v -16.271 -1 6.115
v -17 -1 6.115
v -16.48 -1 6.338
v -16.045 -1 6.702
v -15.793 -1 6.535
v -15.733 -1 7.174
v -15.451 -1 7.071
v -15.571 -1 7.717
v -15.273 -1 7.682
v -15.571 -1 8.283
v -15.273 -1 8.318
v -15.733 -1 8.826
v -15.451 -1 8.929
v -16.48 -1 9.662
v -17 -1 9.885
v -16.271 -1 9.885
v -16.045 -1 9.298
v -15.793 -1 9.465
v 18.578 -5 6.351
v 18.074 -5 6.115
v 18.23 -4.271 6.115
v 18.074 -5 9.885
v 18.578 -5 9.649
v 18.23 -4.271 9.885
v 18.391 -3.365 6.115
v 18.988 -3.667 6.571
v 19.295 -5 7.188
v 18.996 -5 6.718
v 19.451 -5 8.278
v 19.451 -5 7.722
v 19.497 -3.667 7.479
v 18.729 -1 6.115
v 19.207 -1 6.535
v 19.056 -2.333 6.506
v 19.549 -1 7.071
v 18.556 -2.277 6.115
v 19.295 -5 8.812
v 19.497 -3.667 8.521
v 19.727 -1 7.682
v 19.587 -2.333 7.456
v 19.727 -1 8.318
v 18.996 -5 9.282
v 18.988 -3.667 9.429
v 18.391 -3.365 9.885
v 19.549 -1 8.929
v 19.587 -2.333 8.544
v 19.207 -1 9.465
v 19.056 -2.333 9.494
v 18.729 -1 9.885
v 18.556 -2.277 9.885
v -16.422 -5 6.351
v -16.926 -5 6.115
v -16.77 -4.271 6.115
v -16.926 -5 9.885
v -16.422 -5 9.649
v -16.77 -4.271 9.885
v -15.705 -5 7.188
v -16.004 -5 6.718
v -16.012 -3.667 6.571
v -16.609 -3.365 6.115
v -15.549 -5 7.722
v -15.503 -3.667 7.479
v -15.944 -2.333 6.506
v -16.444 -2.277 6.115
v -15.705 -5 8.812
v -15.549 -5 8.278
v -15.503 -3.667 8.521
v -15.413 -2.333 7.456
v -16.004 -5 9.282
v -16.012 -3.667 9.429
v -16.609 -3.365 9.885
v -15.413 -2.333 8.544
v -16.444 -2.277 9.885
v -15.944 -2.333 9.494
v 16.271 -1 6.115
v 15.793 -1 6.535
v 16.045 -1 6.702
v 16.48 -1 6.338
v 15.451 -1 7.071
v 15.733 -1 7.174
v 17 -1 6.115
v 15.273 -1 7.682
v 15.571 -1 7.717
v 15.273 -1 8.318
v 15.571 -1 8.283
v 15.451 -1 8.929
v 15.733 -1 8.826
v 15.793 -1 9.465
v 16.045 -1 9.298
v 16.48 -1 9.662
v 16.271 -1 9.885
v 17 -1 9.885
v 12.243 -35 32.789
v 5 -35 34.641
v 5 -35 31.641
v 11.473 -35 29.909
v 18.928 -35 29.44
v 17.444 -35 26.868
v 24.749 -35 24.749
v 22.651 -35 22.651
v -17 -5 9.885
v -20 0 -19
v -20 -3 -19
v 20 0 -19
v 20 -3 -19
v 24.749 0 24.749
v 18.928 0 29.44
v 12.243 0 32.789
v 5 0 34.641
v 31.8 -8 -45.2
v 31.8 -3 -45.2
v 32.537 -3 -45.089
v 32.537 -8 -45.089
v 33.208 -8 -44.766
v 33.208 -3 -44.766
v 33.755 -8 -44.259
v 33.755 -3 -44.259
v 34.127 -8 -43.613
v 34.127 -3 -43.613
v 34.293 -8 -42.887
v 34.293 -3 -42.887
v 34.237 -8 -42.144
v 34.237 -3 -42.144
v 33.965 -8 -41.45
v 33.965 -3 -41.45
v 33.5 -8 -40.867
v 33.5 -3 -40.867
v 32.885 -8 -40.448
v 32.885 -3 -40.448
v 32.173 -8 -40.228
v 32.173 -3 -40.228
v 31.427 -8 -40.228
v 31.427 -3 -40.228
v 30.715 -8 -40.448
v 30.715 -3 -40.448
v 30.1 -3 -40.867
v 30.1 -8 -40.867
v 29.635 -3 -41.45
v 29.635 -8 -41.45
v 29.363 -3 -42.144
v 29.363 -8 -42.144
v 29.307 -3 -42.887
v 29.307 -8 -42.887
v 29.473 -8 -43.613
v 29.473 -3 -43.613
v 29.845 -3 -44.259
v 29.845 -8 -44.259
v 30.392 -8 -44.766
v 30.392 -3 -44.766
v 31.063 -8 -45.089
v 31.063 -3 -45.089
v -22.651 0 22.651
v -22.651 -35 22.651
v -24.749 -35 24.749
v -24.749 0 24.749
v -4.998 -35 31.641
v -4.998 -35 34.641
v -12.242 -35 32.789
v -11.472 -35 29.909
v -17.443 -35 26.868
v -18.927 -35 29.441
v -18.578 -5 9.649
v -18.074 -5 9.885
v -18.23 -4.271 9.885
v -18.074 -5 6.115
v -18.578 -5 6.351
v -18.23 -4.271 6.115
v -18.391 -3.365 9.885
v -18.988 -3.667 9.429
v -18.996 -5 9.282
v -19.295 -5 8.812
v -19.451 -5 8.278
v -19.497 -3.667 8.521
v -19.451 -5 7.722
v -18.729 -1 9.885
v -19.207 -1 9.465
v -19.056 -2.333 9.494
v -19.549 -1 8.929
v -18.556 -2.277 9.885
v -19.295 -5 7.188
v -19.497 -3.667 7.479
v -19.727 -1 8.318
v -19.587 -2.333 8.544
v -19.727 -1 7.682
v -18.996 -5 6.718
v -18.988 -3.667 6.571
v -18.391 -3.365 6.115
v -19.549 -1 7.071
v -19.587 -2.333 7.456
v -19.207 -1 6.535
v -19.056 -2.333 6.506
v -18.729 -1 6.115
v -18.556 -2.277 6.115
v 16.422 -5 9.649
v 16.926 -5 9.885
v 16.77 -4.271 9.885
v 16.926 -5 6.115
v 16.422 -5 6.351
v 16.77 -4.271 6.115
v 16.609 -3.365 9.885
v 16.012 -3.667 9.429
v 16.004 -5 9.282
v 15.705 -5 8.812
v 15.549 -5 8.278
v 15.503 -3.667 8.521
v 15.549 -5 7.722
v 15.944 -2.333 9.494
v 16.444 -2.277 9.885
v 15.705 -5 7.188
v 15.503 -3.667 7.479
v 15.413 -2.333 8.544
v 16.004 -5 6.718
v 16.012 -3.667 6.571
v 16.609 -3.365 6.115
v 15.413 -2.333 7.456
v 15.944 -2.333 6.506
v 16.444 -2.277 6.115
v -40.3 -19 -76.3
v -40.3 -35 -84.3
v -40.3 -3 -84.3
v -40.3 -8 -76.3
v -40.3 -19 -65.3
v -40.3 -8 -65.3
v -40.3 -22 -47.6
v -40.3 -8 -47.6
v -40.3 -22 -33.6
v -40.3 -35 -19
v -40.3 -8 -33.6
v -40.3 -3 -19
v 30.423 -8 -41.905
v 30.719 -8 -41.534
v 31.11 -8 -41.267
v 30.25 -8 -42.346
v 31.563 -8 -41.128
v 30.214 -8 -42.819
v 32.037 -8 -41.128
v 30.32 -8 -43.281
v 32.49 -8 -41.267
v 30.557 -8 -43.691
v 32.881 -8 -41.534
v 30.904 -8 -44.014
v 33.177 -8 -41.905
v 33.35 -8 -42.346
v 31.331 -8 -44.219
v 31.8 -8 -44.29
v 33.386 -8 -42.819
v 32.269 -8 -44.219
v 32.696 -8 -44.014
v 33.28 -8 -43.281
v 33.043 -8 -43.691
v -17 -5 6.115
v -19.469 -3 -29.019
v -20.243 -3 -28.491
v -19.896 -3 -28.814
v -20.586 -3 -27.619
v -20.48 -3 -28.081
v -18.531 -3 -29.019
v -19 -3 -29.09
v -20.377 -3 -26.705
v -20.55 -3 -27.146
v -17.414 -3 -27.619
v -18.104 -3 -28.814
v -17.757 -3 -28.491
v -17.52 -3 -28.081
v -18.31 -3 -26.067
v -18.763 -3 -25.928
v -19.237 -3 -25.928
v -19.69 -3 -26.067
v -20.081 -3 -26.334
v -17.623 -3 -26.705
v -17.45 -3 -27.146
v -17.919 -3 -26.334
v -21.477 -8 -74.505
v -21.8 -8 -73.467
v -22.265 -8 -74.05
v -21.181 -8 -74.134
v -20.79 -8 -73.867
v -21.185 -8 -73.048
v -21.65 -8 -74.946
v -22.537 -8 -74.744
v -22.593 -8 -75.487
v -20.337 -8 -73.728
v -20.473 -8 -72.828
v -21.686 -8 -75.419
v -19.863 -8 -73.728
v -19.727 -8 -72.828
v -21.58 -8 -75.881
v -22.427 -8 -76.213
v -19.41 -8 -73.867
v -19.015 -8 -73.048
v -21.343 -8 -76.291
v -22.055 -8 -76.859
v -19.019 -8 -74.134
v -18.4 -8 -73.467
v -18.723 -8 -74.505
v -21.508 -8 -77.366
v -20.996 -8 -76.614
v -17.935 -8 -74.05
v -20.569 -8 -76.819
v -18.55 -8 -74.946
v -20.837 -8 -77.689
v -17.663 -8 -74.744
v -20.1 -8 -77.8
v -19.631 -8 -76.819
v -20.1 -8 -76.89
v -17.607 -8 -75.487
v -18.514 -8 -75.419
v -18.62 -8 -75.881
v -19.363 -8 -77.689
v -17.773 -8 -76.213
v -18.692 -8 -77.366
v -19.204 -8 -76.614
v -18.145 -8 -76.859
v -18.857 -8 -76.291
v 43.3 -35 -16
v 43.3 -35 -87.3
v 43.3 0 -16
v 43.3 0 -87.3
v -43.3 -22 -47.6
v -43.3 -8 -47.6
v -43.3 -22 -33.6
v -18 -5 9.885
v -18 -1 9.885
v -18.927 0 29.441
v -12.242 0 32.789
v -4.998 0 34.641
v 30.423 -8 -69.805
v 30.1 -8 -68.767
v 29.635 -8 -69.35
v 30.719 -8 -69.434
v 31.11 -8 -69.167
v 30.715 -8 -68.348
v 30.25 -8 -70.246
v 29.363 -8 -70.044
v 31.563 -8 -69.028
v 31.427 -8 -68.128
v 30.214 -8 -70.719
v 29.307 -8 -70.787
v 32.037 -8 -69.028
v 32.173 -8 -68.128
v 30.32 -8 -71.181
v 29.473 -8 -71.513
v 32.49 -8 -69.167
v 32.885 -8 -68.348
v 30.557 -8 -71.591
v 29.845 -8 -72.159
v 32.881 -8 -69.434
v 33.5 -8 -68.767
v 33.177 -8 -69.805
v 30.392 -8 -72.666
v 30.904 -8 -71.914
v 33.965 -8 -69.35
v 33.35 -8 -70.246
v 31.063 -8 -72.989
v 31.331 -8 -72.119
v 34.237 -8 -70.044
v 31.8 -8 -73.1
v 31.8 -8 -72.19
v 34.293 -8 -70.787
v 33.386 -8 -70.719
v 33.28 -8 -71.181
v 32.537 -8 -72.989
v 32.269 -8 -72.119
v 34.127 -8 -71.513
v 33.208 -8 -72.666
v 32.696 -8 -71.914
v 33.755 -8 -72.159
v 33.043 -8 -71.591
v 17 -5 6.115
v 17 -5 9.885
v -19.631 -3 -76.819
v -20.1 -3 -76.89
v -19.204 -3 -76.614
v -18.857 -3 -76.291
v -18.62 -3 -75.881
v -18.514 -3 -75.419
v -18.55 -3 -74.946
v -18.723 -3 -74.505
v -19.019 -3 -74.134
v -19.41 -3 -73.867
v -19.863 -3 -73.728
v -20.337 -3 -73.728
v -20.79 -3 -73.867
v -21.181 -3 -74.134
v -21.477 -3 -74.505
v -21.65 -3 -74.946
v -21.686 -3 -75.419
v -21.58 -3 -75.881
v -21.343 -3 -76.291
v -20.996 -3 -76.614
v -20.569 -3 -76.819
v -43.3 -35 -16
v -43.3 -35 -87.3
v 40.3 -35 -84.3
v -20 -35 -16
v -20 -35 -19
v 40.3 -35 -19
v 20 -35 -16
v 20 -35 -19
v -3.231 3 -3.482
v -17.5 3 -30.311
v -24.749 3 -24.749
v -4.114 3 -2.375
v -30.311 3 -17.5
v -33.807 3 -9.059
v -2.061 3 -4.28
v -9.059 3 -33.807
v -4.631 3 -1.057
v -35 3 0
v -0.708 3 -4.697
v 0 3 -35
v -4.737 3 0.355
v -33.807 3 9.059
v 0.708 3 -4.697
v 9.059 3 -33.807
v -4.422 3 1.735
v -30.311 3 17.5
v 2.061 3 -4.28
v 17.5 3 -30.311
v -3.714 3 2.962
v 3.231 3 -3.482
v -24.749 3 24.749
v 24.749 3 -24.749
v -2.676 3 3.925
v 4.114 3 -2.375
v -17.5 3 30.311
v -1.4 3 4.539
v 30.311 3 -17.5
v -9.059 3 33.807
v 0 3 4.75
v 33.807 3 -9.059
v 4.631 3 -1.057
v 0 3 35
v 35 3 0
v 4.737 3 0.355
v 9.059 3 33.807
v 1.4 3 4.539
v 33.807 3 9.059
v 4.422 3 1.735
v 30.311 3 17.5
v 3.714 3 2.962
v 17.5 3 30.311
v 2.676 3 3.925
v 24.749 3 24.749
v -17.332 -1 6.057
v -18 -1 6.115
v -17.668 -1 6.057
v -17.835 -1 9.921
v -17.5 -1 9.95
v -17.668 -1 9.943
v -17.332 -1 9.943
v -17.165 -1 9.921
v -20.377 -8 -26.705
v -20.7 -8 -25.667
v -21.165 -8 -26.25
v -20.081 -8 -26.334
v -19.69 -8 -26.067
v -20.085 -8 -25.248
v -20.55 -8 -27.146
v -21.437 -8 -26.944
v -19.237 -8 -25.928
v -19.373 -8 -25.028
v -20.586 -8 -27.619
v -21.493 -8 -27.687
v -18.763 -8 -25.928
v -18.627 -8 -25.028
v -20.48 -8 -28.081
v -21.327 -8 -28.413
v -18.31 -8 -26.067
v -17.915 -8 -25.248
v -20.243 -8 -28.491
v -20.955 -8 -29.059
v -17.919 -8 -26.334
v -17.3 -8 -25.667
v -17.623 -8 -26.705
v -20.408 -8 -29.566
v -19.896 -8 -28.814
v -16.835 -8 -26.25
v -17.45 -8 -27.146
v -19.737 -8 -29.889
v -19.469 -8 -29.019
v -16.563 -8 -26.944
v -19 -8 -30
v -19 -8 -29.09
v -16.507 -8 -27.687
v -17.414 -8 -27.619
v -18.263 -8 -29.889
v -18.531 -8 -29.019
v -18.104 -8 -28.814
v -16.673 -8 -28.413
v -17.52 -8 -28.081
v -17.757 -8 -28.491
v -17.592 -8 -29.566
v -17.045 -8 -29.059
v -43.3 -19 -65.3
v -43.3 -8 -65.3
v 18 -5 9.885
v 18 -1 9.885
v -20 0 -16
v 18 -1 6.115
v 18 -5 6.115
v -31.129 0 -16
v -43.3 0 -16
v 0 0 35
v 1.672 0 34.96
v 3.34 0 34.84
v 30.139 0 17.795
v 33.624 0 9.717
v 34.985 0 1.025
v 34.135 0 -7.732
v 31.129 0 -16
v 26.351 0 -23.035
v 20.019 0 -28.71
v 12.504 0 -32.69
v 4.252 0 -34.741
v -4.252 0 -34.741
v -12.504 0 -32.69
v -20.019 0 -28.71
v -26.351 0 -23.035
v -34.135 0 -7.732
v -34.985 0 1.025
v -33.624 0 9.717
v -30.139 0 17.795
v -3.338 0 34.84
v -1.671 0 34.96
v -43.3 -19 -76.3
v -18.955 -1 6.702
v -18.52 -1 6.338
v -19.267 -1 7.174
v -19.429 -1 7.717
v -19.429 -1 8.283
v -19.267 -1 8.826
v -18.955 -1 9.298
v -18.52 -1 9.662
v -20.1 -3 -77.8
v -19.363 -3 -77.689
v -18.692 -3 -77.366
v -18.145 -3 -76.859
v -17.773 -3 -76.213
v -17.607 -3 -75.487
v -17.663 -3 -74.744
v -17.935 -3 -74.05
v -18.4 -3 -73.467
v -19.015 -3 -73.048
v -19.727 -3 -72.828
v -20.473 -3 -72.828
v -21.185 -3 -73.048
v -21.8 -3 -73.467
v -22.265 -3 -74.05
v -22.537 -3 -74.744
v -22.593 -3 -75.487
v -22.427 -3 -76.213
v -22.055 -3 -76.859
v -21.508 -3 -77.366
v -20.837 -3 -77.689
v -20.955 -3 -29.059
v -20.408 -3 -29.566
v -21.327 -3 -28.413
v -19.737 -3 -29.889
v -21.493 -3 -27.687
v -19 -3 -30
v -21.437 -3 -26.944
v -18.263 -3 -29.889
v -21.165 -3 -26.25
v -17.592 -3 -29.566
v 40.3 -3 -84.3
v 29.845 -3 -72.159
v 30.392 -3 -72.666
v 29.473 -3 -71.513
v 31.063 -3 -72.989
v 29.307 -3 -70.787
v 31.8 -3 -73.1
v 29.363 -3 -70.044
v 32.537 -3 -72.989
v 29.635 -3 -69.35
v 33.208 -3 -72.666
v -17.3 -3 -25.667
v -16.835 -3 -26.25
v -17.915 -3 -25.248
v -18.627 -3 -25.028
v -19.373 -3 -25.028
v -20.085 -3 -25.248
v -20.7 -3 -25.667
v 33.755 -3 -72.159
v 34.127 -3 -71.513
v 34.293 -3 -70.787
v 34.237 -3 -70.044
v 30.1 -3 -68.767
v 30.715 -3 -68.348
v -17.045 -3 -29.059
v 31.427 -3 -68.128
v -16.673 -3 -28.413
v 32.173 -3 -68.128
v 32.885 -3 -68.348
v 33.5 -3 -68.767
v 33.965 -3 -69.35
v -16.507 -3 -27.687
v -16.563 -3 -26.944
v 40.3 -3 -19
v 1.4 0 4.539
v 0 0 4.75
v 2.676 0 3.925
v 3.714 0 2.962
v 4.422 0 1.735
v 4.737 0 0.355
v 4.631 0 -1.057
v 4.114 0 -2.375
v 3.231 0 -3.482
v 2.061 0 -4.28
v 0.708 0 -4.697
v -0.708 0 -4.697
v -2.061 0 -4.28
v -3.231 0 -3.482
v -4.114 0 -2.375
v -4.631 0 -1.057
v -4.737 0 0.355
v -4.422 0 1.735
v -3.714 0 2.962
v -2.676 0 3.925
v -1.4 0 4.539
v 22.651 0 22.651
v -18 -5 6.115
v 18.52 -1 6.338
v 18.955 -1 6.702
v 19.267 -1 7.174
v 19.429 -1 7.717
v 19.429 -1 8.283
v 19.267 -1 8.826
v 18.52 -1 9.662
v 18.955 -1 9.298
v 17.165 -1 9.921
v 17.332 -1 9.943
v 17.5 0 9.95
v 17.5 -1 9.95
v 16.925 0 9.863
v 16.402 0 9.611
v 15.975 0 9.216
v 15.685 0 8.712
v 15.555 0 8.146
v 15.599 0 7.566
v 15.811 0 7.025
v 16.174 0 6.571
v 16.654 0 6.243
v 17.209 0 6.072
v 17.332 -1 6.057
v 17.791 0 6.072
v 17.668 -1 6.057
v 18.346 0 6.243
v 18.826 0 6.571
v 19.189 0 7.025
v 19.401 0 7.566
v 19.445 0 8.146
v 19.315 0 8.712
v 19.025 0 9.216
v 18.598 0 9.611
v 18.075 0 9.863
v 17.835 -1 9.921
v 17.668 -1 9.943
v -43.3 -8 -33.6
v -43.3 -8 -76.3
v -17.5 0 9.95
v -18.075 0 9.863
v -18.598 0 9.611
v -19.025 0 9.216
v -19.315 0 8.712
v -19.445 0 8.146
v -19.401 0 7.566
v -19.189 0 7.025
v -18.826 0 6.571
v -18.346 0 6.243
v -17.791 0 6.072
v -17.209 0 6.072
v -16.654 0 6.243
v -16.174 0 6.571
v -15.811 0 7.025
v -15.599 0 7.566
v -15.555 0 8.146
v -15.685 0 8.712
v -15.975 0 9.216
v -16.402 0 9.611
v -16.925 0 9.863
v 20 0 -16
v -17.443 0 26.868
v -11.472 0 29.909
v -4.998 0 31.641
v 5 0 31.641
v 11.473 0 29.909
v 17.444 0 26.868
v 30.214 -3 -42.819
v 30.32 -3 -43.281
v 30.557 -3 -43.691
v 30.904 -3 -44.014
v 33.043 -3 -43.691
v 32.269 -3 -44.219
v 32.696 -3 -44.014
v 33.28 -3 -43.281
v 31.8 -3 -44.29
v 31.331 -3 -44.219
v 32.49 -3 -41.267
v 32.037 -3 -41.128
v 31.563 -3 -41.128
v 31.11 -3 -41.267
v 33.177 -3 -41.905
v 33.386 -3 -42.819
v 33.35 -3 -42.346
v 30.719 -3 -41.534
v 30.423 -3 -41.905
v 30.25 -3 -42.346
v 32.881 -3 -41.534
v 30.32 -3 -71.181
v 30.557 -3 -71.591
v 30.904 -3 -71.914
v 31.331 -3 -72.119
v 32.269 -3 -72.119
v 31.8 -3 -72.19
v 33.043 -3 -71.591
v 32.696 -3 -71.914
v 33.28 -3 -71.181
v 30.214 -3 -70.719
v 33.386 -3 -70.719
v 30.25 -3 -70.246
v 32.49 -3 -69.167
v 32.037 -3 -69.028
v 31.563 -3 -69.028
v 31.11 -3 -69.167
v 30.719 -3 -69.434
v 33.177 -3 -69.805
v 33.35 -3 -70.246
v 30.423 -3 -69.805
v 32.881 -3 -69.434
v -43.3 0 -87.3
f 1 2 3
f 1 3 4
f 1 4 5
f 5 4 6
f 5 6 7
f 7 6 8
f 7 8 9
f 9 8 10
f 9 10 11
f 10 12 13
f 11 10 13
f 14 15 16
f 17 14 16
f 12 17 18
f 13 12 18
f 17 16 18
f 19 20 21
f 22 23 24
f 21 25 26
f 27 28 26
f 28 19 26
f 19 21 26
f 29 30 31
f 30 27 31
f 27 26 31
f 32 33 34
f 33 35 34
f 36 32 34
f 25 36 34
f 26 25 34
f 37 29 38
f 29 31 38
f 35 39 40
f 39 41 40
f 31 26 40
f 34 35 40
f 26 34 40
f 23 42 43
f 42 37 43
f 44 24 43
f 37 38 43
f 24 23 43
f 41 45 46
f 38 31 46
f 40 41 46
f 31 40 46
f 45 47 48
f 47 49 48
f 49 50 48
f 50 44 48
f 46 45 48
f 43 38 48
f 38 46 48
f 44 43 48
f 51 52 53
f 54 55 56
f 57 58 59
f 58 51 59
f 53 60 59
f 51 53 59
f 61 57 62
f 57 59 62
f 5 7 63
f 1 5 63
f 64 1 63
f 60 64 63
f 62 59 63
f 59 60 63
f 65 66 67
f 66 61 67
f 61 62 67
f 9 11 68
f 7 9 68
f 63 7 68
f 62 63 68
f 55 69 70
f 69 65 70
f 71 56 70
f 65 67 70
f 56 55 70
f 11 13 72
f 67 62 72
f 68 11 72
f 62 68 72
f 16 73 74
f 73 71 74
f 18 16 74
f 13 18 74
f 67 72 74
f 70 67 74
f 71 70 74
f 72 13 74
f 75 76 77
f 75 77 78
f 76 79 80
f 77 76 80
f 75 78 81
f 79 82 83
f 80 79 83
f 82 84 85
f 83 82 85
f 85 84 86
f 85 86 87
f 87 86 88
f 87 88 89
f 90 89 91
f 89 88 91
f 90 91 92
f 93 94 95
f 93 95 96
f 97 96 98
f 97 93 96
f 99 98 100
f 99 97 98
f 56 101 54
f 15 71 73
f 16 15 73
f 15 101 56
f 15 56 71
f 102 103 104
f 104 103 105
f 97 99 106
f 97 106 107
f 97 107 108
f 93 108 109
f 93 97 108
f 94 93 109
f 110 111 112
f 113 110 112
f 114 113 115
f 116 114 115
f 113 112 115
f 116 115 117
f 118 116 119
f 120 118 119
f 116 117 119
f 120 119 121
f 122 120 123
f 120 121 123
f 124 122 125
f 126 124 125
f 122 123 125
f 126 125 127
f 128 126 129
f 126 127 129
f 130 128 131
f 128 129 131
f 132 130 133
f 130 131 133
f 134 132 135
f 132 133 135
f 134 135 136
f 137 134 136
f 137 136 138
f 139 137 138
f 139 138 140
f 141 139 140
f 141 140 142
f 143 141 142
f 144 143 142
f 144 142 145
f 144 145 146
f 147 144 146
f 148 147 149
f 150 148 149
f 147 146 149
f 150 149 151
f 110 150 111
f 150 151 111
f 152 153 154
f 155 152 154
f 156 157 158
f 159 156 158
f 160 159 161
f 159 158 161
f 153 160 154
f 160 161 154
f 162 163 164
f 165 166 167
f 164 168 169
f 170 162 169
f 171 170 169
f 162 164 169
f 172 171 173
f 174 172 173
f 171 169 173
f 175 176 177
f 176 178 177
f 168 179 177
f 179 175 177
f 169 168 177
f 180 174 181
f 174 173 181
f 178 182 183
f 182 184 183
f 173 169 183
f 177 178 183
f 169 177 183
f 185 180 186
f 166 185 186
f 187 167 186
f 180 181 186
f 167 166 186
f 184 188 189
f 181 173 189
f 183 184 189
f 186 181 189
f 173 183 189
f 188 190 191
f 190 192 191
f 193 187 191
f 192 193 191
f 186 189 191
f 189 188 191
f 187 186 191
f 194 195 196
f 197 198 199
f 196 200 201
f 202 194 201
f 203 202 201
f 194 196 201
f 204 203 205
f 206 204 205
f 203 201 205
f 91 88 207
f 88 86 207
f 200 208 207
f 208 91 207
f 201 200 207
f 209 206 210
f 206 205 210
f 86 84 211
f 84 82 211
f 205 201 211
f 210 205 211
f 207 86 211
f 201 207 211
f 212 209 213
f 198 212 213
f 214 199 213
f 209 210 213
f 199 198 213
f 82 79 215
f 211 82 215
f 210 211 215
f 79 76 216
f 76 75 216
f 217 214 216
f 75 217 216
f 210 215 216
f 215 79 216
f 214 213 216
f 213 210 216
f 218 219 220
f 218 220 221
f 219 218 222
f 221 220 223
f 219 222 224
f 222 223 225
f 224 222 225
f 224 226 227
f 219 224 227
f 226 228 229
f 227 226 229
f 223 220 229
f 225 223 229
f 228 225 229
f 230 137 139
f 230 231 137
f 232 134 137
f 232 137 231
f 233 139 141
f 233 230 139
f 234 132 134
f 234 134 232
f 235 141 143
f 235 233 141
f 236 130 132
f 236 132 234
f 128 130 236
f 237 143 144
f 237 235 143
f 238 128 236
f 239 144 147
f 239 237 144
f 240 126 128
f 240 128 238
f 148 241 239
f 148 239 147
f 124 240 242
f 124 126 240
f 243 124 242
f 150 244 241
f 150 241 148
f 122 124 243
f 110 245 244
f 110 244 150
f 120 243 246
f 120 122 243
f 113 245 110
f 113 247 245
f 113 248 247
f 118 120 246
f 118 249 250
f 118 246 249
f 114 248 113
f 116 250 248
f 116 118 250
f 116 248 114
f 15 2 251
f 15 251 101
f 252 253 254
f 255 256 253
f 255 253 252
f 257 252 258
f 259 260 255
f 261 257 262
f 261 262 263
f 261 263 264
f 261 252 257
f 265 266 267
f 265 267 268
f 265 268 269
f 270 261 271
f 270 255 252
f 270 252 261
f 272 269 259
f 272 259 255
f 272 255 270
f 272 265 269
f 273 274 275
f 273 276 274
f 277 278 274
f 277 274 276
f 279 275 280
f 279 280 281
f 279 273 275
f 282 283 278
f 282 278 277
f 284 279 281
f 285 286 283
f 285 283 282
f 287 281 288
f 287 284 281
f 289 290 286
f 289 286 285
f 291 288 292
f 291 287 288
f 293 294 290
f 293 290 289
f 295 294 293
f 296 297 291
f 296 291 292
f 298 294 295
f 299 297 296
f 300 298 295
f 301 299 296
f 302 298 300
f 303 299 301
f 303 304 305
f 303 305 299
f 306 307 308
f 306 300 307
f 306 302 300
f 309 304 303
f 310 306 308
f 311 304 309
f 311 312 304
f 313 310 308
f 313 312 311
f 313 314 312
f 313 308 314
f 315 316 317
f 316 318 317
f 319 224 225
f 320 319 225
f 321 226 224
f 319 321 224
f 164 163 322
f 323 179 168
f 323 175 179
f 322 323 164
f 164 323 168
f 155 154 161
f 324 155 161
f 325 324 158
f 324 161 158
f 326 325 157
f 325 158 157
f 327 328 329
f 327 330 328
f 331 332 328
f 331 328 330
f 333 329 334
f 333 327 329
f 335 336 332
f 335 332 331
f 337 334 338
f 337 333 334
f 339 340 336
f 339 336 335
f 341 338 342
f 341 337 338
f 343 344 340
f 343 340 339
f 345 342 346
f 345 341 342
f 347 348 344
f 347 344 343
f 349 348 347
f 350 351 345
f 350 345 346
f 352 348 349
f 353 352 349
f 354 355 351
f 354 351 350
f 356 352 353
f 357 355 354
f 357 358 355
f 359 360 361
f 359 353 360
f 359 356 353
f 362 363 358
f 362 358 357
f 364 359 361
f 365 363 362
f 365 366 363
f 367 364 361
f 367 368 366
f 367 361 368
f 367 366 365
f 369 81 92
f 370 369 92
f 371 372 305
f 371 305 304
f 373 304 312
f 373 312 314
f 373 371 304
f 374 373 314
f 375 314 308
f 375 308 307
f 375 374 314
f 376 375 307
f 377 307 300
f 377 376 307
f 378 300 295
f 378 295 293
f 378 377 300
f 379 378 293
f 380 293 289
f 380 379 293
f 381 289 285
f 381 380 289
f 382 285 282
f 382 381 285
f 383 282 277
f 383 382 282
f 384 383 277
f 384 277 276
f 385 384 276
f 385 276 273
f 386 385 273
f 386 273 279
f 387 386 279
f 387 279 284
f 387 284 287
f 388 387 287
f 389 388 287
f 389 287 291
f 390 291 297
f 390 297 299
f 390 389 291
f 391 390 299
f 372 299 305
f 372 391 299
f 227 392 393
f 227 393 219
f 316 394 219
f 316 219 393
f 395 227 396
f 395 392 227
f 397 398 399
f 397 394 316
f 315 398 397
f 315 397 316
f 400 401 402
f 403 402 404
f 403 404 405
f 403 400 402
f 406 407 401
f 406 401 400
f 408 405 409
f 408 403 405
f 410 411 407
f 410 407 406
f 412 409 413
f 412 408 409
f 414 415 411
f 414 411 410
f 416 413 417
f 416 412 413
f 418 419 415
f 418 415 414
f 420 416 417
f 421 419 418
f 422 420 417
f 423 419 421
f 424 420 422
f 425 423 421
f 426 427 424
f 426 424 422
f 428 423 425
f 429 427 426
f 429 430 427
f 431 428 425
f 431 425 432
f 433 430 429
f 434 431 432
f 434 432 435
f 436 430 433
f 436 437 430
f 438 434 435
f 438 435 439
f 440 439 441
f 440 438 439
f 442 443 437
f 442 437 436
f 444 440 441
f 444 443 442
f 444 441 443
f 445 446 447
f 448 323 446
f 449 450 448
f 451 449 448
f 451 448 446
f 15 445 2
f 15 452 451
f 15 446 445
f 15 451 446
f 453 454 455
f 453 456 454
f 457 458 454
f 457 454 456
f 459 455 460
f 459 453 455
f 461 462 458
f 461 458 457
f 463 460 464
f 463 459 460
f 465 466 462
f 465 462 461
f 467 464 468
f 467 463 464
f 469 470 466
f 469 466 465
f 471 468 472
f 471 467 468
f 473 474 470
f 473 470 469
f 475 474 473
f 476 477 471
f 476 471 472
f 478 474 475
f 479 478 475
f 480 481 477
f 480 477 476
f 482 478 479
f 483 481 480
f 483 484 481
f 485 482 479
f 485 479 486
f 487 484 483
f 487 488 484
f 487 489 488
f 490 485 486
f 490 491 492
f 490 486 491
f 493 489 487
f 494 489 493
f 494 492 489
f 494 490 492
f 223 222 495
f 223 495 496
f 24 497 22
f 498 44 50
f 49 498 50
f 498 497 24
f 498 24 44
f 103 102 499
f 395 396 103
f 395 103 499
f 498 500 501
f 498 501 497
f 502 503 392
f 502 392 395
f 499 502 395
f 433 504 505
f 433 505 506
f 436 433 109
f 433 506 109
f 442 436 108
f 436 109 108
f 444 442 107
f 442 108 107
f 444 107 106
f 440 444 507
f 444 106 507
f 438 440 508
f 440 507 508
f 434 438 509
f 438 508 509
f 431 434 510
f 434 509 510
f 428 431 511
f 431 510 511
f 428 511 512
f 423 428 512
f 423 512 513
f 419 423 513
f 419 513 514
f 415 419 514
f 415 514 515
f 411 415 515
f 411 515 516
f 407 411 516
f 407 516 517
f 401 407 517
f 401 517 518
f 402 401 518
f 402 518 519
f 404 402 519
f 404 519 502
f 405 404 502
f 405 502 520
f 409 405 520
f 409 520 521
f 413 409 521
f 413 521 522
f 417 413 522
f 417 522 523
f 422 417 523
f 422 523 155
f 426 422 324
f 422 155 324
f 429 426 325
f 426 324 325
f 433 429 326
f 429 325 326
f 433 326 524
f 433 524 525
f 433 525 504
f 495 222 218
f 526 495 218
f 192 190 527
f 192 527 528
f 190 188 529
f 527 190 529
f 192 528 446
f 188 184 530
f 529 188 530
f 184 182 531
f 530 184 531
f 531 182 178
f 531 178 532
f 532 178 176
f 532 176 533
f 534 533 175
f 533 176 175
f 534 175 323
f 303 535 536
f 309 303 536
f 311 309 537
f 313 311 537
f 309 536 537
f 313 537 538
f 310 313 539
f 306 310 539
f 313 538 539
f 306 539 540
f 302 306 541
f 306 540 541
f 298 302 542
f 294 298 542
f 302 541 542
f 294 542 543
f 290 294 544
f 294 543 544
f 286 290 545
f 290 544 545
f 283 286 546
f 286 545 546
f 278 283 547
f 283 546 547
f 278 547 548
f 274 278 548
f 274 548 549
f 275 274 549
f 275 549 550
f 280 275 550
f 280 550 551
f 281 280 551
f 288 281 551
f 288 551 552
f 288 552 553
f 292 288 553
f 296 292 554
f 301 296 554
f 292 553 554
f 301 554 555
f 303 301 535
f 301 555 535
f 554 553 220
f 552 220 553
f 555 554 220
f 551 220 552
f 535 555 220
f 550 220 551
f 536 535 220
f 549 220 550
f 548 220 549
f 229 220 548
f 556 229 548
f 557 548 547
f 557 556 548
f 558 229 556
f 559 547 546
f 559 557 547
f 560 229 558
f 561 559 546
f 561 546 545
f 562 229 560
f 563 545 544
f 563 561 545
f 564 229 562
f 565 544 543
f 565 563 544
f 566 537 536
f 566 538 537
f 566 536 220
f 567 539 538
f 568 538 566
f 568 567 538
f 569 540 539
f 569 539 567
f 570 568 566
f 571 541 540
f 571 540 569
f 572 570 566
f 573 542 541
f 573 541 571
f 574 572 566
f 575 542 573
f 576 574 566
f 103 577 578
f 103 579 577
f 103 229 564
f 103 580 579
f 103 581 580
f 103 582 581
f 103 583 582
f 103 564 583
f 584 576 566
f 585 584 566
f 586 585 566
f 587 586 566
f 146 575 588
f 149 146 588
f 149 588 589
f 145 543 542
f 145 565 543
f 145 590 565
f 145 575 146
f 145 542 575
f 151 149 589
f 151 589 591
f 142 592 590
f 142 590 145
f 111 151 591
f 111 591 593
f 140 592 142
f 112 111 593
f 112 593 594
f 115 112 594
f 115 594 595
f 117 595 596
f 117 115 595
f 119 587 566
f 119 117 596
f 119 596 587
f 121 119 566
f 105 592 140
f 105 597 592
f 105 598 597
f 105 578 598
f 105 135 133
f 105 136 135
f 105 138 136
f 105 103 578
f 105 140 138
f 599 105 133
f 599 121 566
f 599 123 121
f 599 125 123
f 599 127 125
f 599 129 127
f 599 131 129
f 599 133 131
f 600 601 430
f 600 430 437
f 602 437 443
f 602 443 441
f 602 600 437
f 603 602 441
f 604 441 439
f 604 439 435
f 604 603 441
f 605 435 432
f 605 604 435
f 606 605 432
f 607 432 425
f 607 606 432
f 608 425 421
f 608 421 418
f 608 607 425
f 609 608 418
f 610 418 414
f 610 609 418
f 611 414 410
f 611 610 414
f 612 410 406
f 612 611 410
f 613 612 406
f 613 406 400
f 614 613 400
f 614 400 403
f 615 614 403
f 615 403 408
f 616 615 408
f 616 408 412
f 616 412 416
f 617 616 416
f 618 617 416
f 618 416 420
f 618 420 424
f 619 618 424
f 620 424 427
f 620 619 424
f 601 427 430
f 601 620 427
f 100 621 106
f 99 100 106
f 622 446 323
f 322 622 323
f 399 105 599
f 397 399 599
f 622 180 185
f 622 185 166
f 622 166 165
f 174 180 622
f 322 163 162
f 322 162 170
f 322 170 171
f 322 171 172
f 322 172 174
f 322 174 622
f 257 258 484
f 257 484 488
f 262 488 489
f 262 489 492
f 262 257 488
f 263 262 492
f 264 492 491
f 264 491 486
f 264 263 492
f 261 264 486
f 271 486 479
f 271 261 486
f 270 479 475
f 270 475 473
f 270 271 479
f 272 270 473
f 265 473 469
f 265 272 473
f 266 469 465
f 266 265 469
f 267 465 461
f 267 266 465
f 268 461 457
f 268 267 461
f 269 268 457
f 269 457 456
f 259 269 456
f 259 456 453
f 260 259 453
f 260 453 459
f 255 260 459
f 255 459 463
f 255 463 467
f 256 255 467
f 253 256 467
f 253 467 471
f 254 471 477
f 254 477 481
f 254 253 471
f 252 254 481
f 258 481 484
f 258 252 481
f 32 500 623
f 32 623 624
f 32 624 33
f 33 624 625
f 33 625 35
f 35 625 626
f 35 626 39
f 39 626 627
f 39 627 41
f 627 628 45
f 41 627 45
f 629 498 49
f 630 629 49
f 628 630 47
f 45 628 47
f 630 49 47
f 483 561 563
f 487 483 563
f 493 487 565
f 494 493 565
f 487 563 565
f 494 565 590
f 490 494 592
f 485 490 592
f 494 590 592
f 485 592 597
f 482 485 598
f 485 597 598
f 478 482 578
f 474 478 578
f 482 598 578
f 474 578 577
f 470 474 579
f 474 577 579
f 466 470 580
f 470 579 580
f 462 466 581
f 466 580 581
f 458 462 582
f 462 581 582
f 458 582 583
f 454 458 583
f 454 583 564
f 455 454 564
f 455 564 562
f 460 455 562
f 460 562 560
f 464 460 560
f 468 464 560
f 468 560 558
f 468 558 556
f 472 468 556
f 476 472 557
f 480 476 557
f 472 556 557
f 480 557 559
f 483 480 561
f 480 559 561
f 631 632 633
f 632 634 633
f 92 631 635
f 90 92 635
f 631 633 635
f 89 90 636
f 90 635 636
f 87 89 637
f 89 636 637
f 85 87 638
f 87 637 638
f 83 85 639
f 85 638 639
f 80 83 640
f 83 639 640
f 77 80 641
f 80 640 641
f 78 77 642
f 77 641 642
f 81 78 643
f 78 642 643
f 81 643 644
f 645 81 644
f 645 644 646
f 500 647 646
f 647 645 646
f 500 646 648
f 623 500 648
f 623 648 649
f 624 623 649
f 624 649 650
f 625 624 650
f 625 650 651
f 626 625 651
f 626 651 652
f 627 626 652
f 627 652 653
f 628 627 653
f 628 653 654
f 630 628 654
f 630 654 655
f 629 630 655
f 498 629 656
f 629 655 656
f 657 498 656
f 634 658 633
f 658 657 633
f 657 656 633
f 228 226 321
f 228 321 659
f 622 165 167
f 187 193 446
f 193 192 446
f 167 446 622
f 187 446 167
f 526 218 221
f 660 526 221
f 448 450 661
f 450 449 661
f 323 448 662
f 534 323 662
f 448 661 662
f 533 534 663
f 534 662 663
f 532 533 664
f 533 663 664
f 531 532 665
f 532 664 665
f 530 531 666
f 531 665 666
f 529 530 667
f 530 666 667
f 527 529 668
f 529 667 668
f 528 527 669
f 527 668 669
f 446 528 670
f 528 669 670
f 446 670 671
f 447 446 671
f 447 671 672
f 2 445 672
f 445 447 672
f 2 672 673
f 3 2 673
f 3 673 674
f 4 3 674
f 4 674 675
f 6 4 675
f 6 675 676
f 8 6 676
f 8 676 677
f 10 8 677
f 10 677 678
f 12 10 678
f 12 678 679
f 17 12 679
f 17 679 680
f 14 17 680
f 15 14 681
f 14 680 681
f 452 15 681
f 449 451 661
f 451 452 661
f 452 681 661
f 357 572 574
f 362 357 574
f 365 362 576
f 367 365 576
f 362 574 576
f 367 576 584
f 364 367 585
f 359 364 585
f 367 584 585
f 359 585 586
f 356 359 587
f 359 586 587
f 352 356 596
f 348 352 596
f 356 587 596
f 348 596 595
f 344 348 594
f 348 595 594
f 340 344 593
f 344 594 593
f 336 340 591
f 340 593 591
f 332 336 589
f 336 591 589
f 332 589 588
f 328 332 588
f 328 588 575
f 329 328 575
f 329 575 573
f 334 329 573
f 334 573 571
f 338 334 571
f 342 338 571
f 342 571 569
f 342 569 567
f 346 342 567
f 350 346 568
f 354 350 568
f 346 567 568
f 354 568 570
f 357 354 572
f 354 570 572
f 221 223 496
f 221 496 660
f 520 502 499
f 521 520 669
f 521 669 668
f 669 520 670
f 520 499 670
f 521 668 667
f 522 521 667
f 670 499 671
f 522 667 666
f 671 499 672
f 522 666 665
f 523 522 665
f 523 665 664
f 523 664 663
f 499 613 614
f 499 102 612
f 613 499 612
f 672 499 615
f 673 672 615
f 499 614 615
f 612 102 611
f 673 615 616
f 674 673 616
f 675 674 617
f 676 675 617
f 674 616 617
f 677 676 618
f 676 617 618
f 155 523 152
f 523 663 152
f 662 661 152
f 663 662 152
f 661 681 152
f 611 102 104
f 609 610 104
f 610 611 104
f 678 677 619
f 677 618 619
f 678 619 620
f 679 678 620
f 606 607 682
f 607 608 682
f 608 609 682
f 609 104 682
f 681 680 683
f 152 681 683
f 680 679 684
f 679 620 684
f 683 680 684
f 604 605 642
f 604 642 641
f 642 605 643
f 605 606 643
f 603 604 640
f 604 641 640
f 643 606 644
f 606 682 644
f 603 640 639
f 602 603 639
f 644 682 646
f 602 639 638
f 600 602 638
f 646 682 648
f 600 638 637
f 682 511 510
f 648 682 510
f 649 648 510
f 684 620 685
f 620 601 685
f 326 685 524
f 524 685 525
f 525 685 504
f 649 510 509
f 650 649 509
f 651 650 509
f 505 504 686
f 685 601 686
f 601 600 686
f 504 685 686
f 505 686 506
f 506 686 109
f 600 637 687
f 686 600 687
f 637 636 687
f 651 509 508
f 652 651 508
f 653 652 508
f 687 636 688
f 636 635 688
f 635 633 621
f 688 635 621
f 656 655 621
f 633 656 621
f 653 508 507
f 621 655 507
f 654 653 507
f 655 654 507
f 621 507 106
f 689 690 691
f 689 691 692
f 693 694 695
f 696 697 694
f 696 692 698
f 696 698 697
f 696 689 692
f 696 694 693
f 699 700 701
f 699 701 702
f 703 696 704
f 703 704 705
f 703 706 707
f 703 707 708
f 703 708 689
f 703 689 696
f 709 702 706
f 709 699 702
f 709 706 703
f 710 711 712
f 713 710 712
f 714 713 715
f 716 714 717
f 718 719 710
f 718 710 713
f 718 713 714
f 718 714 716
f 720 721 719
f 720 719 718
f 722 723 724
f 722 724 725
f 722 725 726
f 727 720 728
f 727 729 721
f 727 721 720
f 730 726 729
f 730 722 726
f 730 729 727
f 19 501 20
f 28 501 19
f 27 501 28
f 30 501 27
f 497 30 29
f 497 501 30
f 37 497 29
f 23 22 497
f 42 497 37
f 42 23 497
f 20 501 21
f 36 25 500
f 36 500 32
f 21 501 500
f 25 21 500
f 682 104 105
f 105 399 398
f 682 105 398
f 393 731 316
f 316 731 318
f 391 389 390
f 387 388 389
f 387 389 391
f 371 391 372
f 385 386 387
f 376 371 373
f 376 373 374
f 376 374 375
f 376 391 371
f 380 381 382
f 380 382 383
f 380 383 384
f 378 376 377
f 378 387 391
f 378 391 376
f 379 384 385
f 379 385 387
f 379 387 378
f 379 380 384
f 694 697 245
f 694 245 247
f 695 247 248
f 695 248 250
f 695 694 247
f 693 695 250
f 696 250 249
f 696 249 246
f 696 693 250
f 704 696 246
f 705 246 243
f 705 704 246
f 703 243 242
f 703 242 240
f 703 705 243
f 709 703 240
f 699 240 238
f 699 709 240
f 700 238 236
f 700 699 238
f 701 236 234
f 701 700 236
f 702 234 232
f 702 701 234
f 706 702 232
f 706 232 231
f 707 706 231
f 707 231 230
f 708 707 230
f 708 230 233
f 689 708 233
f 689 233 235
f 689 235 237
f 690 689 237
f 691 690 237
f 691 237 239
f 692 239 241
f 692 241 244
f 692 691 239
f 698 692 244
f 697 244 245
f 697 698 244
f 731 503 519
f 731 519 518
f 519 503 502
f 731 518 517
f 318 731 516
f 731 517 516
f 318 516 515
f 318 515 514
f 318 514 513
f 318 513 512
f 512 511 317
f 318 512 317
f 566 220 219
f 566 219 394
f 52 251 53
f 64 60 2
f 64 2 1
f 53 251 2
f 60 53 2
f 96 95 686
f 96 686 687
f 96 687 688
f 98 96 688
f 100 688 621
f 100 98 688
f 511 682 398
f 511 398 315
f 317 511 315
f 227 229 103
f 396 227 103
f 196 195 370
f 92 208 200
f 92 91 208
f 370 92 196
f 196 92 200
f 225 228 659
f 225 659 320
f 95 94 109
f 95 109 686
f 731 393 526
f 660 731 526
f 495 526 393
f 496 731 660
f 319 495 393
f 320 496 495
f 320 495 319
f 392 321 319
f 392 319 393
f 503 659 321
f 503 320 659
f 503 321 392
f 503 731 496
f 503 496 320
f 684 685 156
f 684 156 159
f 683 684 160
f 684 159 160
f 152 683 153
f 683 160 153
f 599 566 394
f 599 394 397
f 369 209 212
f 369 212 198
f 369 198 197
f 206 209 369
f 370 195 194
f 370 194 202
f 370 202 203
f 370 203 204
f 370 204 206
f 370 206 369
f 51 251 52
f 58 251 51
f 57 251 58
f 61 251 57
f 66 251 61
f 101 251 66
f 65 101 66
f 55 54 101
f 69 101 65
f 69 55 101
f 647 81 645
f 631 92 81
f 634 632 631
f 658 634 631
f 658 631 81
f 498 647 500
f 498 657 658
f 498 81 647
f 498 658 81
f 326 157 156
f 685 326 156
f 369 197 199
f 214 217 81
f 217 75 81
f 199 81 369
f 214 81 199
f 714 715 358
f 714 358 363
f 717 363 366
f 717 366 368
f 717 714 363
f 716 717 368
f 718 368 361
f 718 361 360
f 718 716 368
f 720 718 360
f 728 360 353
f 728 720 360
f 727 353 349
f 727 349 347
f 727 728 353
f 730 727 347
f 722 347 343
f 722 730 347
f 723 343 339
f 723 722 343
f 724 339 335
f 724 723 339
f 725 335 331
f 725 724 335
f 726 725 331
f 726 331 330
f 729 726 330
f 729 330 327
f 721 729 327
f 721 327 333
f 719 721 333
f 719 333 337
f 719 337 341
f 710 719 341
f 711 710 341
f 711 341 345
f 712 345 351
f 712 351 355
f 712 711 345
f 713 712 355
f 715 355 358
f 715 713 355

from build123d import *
from build123d.topology import SkipClean

# Parameters (mm, degrees)
CROQUIS1_R                        = 35
CROQUIS1_R_2                      = 4.75
SALIENTE_EXTRUIR1_DEPTH           = 3
CROQUIS2_R                        = 1.95
SALIENTE_EXTRUIR2_DEPTH           = 5
SALIENTE_EXTRUIR3_START           = 1
CROQUIS5_R                        = 2.25
SALIENTE_EXTRUIR3_DEPTH           = 4
SALIENTE_EXTRUIR3_DRAFT           = 4
SALIENTE_EXTRUIR3_PROFILE_2_DEPTH = 4
SALIENTE_EXTRUIR3_PROFILE_2_DRAFT = 4
CROQUIS3_W                        = 1
CROQUIS3_H                        = 6.840682912
CORTAR_EXTRUIR1_DEPTH             = 4
CROQUIS6_W                        = 5.727241663
CROQUIS6_H                        = 1.622786798
CROQUIS6_W_2                      = 5.017003251
CROQUIS6_H_2                      = 0.546869116
CROQUIS6_W_3                      = 4.668475527
CROQUIS6_H_3                      = 1.179349449
CROQUIS6_W_4                      = 4.588943699
CROQUIS6_H_4                      = 1.521824685
CORTAR_EXTRUIR2_DEPTH             = 4
SALIENTE_EXTRUIR4_START           = 35
SALIENTE_EXTRUIR4_DEPTH           = 35
CROQUIS9_W                        = 86.6
CROQUIS9_H                        = 71.3
SALIENTE_EXTRUIR5_DEPTH           = 3
CROQUIS10_W                       = 86.6
CROQUIS10_H                       = 71.3
CROQUIS10_W_2                     = 80.6
CROQUIS10_H_2                     = 65.3
SALIENTE_EXTRUIR6_DEPTH           = 32
CORTAR_EXTRUIR3_REACH             = 106.595
CROQUIS11_W                       = 40
CROQUIS11_H                       = 3
CROQUIS12_R                       = 2.5
CROQUIS12_R_2                     = 1.59
SALIENTE_EXTRUIR7_DEPTH           = 5
CROQUIS13_W                       = 14
CROQUIS13_H                       = 14
CROQUIS13_W_2                     = 11
CROQUIS13_H_2                     = 11
CORTAR_EXTRUIR4_DEPTH             = 3


with BuildPart() as part:
    # Croquis1 → Saliente-Extruir1 (new body)
    with BuildSketch(Plane(origin=(0, 0, 0), x_dir=(1, 0, 0), z_dir=(0, 1, 0))):
        with Locations(Location((0, 0, 0), (0, 0, 270))):
            Circle(CROQUIS1_R)
        with Locations(Location((0, 0, 0), (0, 0, 270))):
            Circle(CROQUIS1_R_2, mode=Mode.SUBTRACT)
    extrude(amount=SALIENTE_EXTRUIR1_DEPTH)

    # Croquis2 → Saliente-Extruir2 (add)
    with BuildSketch(Plane.XZ):
        with Locations(Location((-17.5, 8, 0), (0, 0, 90))):
            Circle(CROQUIS2_R)
        with Locations(Location((17.5, 8, 0), (0, 0, 90))):
            Circle(CROQUIS2_R)
    extrude(amount=SALIENTE_EXTRUIR2_DEPTH)


with BuildPart() as saliente_extruir3_tool:
    # Croquis5 → Saliente-Extruir3 (with draft: the straight prism first)
    with BuildSketch(Plane.XZ.offset(SALIENTE_EXTRUIR3_START)):
        with Locations((-17.5, 8)):
            Circle(CROQUIS5_R)
    extrude(amount=SALIENTE_EXTRUIR3_DEPTH)
    # Saliente-Extruir3: the draft: its side faces are tilted about the plane it starts from
    saliente_extruir3_sides = [saliente_extruir3_tool.faces().sort_by_distance(p)[0] for p in [
        (-19.75, -3, 8),
    ]]
    draft(saliente_extruir3_sides, Plane.XZ.offset(SALIENTE_EXTRUIR3_START), SALIENTE_EXTRUIR3_DRAFT)


with BuildPart() as part_1:
    add(part.part)

    # Saliente-Extruir3: add saliente_extruir3_tool
    add(saliente_extruir3_tool.part)


with BuildPart() as saliente_extruir3_profile_2_tool:
    # Croquis5 → Saliente-Extruir3 profile 2 (with draft: the straight prism first)
    with BuildSketch(Plane.XZ.offset(SALIENTE_EXTRUIR3_START)):
        with Locations((17.5, 8)):
            Circle(CROQUIS5_R)
    extrude(amount=SALIENTE_EXTRUIR3_PROFILE_2_DEPTH)
    # Saliente-Extruir3 profile 2: the draft: its side faces are tilted about the plane it starts from
    saliente_extruir3_profile_2_sides = [saliente_extruir3_profile_2_tool.faces().sort_by_distance(p)[0] for p in [
        (15.25, -3, 8),
    ]]
    draft(saliente_extruir3_profile_2_sides, Plane.XZ.offset(SALIENTE_EXTRUIR3_START), SALIENTE_EXTRUIR3_PROFILE_2_DRAFT)


with BuildPart() as part_2:
    add(part_1.part)

    # Saliente-Extruir3 profile 2: add saliente_extruir3_profile_2_tool
    add(saliente_extruir3_profile_2_tool.part)

    # Croquis3 → Cortar-Extruir1 (cut)
    with BuildSketch(Plane.XZ.offset(5)):
        with Locations((-17.5, 7.675365729)):
            Rectangle(CROQUIS3_W, CROQUIS3_H)
        with Locations((17.5, 7.675365729)):
            Rectangle(CROQUIS3_W, CROQUIS3_H)
    extrude(amount=-CORTAR_EXTRUIR1_DEPTH, mode=Mode.SUBTRACT)

    # Croquis6 → Cortar-Extruir2 (cut)
    with BuildSketch(Plane.XZ.offset(1)):
        with Locations((-17.258839661, 10.696201081)):
            Rectangle(CROQUIS6_W, CROQUIS6_H)
        with Locations((-17.417509945, 5.84175776)):
            Rectangle(CROQUIS6_W_2, CROQUIS6_H_2)
        with Locations((17.632507556, 10.474482406)):
            Rectangle(CROQUIS6_W_3, CROQUIS6_H_3)
        with Locations((17.310781188, 5.354279976)):
            Rectangle(CROQUIS6_W_4, CROQUIS6_H_4)
    extrude(amount=CORTAR_EXTRUIR2_DEPTH, mode=Mode.SUBTRACT)

    # Croquis7 → Saliente-Extruir4 (add)
    with SkipClean():  # the faces are left unmerged after this step: merging them gives an invalid solid
        with BuildSketch(Plane.XZ.offset(SALIENTE_EXTRUIR4_START)):
            with BuildLine():
                Line((-22.651194874, 22.651194874), (-24.748737342, 24.748737342))
                ThreePointArc((-24.748737342, 24.748737342), (-15.674335611, 31.294012257), (-4.998139738, 34.641284606))
                Line((-4.998139738, 34.641284606), (-4.998139738, 31.641284606))
                ThreePointArc((-4.998139738, 31.641284606), (-14.537086186, 28.545154562), (-22.651194874, 22.651194874))
            make_face()
            with BuildLine():
                Line((22.651200534, 22.651200534), (24.748737342, 24.748737342))
                ThreePointArc((24.748737342, 24.748737342), (15.675128347, 31.293615184), (4.999894801, 34.641031335))
                Line((4.999894801, 34.641031335), (4.999894801, 31.641031335))
                ThreePointArc((4.999894801, 31.641031335), (14.537881979, 28.544766366), (22.651200534, 22.651200534))
            make_face()
        extrude(amount=-SALIENTE_EXTRUIR4_DEPTH)

    # Croquis9 → Saliente-Extruir5 (add)
    with SkipClean():  # the faces are left unmerged after this step: merging them gives an invalid solid
        with BuildSketch(Plane.XZ):
            with Locations((0, -51.65)):
                Rectangle(CROQUIS9_W, CROQUIS9_H)
        extrude(amount=SALIENTE_EXTRUIR5_DEPTH)

    # Croquis10 → Saliente-Extruir6 (add)
    with SkipClean():  # the faces are left unmerged after this step: merging them gives an invalid solid
        with BuildSketch(Plane.XZ.offset(3)):
            with Locations((0, -51.65)):
                Rectangle(CROQUIS10_W, CROQUIS10_H)
            with Locations((0, -51.65)):
                Rectangle(CROQUIS10_W_2, CROQUIS10_H_2, mode=Mode.SUBTRACT)
        extrude(amount=SALIENTE_EXTRUIR6_DEPTH)

    # Cortar-Extruir3: up to this face of the body (flat: up to its plane)
    cortar_extruir3_end = Plane(part_2.part.faces().sort_by_distance((1.0887e-05, 0, 5.820345138))[0])
    # Croquis11 → Cortar-Extruir3 (cut, up to the picked face)
    with BuildSketch(Plane.XZ.offset(35), mode=Mode.PRIVATE) as cortar_extruir3_sk1:
        with Locations((0, -17.5)):
            Rectangle(CROQUIS11_W, CROQUIS11_H)
    cortar_extruir3_tool1 = split(extrude(cortar_extruir3_sk1.sketch, amount=-CORTAR_EXTRUIR3_REACH, mode=Mode.PRIVATE), bisect_by=cortar_extruir3_end, keep=Keep.BOTH, mode=Mode.PRIVATE)
    add(cortar_extruir3_tool1.solids().sort_by(Axis((0, -35, -17.5), (0, 1, 0)))[0], mode=Mode.SUBTRACT)

    # Croquis12 → Saliente-Extruir7 (add)
    # profile 1 of 4: a face of its own
    with SkipClean():  # the faces are left unmerged after this step: merging them gives an invalid solid
        with BuildSketch(Plane.XZ.offset(3)):
            with Locations(Location((31.8, -42.7, 0), (0, 0, 270))):
                Circle(CROQUIS12_R)
            with Locations(Location((31.8, -42.7, 0), (0, 0, 270))):
                Circle(CROQUIS12_R_2, mode=Mode.SUBTRACT)
        # profile 2 of 4: a face of its own
        with BuildSketch(Plane.XZ.offset(3)):
            with Locations(Location((31.8, -70.6, 0), (0, 0, 270))):
                Circle(CROQUIS12_R)
            with Locations(Location((31.8, -70.6, 0), (0, 0, 270))):
                Circle(CROQUIS12_R_2, mode=Mode.SUBTRACT)
        # profile 3 of 4: a face of its own
        with BuildSketch(Plane.XZ.offset(3)):
            with Locations(Location((-19, -27.5, 0), (0, 0, 270))):
                Circle(CROQUIS12_R)
            with Locations(Location((-19, -27.5, 0), (0, 0, 270))):
                Circle(CROQUIS12_R_2, mode=Mode.SUBTRACT)
        # profile 4 of 4: a face of its own
        with BuildSketch(Plane.XZ.offset(3)):
            with Locations(Location((-20.1, -75.3, 0), (0, 0, 270))):
                Circle(CROQUIS12_R)
            with Locations(Location((-20.1, -75.3, 0), (0, 0, 270))):
                Circle(CROQUIS12_R_2, mode=Mode.SUBTRACT)
        extrude(amount=SALIENTE_EXTRUIR7_DEPTH)

    # Croquis13 → Cortar-Extruir4 (cut)
    with SkipClean():  # the faces are left unmerged after this step: merging them gives an invalid solid
        with BuildSketch(Plane(origin=(-40.3, 0, 0), x_dir=(0, 0, -1), z_dir=(1, 0, 0))):
            with Locations((40.6, -15)):
                Rectangle(CROQUIS13_W, CROQUIS13_H)
            with Locations((70.8, -13.5)):
                Rectangle(CROQUIS13_W_2, CROQUIS13_H_2)
        extrude(amount=-CORTAR_EXTRUIR4_DEPTH, mode=Mode.SUBTRACT)


solid = part_2.part
